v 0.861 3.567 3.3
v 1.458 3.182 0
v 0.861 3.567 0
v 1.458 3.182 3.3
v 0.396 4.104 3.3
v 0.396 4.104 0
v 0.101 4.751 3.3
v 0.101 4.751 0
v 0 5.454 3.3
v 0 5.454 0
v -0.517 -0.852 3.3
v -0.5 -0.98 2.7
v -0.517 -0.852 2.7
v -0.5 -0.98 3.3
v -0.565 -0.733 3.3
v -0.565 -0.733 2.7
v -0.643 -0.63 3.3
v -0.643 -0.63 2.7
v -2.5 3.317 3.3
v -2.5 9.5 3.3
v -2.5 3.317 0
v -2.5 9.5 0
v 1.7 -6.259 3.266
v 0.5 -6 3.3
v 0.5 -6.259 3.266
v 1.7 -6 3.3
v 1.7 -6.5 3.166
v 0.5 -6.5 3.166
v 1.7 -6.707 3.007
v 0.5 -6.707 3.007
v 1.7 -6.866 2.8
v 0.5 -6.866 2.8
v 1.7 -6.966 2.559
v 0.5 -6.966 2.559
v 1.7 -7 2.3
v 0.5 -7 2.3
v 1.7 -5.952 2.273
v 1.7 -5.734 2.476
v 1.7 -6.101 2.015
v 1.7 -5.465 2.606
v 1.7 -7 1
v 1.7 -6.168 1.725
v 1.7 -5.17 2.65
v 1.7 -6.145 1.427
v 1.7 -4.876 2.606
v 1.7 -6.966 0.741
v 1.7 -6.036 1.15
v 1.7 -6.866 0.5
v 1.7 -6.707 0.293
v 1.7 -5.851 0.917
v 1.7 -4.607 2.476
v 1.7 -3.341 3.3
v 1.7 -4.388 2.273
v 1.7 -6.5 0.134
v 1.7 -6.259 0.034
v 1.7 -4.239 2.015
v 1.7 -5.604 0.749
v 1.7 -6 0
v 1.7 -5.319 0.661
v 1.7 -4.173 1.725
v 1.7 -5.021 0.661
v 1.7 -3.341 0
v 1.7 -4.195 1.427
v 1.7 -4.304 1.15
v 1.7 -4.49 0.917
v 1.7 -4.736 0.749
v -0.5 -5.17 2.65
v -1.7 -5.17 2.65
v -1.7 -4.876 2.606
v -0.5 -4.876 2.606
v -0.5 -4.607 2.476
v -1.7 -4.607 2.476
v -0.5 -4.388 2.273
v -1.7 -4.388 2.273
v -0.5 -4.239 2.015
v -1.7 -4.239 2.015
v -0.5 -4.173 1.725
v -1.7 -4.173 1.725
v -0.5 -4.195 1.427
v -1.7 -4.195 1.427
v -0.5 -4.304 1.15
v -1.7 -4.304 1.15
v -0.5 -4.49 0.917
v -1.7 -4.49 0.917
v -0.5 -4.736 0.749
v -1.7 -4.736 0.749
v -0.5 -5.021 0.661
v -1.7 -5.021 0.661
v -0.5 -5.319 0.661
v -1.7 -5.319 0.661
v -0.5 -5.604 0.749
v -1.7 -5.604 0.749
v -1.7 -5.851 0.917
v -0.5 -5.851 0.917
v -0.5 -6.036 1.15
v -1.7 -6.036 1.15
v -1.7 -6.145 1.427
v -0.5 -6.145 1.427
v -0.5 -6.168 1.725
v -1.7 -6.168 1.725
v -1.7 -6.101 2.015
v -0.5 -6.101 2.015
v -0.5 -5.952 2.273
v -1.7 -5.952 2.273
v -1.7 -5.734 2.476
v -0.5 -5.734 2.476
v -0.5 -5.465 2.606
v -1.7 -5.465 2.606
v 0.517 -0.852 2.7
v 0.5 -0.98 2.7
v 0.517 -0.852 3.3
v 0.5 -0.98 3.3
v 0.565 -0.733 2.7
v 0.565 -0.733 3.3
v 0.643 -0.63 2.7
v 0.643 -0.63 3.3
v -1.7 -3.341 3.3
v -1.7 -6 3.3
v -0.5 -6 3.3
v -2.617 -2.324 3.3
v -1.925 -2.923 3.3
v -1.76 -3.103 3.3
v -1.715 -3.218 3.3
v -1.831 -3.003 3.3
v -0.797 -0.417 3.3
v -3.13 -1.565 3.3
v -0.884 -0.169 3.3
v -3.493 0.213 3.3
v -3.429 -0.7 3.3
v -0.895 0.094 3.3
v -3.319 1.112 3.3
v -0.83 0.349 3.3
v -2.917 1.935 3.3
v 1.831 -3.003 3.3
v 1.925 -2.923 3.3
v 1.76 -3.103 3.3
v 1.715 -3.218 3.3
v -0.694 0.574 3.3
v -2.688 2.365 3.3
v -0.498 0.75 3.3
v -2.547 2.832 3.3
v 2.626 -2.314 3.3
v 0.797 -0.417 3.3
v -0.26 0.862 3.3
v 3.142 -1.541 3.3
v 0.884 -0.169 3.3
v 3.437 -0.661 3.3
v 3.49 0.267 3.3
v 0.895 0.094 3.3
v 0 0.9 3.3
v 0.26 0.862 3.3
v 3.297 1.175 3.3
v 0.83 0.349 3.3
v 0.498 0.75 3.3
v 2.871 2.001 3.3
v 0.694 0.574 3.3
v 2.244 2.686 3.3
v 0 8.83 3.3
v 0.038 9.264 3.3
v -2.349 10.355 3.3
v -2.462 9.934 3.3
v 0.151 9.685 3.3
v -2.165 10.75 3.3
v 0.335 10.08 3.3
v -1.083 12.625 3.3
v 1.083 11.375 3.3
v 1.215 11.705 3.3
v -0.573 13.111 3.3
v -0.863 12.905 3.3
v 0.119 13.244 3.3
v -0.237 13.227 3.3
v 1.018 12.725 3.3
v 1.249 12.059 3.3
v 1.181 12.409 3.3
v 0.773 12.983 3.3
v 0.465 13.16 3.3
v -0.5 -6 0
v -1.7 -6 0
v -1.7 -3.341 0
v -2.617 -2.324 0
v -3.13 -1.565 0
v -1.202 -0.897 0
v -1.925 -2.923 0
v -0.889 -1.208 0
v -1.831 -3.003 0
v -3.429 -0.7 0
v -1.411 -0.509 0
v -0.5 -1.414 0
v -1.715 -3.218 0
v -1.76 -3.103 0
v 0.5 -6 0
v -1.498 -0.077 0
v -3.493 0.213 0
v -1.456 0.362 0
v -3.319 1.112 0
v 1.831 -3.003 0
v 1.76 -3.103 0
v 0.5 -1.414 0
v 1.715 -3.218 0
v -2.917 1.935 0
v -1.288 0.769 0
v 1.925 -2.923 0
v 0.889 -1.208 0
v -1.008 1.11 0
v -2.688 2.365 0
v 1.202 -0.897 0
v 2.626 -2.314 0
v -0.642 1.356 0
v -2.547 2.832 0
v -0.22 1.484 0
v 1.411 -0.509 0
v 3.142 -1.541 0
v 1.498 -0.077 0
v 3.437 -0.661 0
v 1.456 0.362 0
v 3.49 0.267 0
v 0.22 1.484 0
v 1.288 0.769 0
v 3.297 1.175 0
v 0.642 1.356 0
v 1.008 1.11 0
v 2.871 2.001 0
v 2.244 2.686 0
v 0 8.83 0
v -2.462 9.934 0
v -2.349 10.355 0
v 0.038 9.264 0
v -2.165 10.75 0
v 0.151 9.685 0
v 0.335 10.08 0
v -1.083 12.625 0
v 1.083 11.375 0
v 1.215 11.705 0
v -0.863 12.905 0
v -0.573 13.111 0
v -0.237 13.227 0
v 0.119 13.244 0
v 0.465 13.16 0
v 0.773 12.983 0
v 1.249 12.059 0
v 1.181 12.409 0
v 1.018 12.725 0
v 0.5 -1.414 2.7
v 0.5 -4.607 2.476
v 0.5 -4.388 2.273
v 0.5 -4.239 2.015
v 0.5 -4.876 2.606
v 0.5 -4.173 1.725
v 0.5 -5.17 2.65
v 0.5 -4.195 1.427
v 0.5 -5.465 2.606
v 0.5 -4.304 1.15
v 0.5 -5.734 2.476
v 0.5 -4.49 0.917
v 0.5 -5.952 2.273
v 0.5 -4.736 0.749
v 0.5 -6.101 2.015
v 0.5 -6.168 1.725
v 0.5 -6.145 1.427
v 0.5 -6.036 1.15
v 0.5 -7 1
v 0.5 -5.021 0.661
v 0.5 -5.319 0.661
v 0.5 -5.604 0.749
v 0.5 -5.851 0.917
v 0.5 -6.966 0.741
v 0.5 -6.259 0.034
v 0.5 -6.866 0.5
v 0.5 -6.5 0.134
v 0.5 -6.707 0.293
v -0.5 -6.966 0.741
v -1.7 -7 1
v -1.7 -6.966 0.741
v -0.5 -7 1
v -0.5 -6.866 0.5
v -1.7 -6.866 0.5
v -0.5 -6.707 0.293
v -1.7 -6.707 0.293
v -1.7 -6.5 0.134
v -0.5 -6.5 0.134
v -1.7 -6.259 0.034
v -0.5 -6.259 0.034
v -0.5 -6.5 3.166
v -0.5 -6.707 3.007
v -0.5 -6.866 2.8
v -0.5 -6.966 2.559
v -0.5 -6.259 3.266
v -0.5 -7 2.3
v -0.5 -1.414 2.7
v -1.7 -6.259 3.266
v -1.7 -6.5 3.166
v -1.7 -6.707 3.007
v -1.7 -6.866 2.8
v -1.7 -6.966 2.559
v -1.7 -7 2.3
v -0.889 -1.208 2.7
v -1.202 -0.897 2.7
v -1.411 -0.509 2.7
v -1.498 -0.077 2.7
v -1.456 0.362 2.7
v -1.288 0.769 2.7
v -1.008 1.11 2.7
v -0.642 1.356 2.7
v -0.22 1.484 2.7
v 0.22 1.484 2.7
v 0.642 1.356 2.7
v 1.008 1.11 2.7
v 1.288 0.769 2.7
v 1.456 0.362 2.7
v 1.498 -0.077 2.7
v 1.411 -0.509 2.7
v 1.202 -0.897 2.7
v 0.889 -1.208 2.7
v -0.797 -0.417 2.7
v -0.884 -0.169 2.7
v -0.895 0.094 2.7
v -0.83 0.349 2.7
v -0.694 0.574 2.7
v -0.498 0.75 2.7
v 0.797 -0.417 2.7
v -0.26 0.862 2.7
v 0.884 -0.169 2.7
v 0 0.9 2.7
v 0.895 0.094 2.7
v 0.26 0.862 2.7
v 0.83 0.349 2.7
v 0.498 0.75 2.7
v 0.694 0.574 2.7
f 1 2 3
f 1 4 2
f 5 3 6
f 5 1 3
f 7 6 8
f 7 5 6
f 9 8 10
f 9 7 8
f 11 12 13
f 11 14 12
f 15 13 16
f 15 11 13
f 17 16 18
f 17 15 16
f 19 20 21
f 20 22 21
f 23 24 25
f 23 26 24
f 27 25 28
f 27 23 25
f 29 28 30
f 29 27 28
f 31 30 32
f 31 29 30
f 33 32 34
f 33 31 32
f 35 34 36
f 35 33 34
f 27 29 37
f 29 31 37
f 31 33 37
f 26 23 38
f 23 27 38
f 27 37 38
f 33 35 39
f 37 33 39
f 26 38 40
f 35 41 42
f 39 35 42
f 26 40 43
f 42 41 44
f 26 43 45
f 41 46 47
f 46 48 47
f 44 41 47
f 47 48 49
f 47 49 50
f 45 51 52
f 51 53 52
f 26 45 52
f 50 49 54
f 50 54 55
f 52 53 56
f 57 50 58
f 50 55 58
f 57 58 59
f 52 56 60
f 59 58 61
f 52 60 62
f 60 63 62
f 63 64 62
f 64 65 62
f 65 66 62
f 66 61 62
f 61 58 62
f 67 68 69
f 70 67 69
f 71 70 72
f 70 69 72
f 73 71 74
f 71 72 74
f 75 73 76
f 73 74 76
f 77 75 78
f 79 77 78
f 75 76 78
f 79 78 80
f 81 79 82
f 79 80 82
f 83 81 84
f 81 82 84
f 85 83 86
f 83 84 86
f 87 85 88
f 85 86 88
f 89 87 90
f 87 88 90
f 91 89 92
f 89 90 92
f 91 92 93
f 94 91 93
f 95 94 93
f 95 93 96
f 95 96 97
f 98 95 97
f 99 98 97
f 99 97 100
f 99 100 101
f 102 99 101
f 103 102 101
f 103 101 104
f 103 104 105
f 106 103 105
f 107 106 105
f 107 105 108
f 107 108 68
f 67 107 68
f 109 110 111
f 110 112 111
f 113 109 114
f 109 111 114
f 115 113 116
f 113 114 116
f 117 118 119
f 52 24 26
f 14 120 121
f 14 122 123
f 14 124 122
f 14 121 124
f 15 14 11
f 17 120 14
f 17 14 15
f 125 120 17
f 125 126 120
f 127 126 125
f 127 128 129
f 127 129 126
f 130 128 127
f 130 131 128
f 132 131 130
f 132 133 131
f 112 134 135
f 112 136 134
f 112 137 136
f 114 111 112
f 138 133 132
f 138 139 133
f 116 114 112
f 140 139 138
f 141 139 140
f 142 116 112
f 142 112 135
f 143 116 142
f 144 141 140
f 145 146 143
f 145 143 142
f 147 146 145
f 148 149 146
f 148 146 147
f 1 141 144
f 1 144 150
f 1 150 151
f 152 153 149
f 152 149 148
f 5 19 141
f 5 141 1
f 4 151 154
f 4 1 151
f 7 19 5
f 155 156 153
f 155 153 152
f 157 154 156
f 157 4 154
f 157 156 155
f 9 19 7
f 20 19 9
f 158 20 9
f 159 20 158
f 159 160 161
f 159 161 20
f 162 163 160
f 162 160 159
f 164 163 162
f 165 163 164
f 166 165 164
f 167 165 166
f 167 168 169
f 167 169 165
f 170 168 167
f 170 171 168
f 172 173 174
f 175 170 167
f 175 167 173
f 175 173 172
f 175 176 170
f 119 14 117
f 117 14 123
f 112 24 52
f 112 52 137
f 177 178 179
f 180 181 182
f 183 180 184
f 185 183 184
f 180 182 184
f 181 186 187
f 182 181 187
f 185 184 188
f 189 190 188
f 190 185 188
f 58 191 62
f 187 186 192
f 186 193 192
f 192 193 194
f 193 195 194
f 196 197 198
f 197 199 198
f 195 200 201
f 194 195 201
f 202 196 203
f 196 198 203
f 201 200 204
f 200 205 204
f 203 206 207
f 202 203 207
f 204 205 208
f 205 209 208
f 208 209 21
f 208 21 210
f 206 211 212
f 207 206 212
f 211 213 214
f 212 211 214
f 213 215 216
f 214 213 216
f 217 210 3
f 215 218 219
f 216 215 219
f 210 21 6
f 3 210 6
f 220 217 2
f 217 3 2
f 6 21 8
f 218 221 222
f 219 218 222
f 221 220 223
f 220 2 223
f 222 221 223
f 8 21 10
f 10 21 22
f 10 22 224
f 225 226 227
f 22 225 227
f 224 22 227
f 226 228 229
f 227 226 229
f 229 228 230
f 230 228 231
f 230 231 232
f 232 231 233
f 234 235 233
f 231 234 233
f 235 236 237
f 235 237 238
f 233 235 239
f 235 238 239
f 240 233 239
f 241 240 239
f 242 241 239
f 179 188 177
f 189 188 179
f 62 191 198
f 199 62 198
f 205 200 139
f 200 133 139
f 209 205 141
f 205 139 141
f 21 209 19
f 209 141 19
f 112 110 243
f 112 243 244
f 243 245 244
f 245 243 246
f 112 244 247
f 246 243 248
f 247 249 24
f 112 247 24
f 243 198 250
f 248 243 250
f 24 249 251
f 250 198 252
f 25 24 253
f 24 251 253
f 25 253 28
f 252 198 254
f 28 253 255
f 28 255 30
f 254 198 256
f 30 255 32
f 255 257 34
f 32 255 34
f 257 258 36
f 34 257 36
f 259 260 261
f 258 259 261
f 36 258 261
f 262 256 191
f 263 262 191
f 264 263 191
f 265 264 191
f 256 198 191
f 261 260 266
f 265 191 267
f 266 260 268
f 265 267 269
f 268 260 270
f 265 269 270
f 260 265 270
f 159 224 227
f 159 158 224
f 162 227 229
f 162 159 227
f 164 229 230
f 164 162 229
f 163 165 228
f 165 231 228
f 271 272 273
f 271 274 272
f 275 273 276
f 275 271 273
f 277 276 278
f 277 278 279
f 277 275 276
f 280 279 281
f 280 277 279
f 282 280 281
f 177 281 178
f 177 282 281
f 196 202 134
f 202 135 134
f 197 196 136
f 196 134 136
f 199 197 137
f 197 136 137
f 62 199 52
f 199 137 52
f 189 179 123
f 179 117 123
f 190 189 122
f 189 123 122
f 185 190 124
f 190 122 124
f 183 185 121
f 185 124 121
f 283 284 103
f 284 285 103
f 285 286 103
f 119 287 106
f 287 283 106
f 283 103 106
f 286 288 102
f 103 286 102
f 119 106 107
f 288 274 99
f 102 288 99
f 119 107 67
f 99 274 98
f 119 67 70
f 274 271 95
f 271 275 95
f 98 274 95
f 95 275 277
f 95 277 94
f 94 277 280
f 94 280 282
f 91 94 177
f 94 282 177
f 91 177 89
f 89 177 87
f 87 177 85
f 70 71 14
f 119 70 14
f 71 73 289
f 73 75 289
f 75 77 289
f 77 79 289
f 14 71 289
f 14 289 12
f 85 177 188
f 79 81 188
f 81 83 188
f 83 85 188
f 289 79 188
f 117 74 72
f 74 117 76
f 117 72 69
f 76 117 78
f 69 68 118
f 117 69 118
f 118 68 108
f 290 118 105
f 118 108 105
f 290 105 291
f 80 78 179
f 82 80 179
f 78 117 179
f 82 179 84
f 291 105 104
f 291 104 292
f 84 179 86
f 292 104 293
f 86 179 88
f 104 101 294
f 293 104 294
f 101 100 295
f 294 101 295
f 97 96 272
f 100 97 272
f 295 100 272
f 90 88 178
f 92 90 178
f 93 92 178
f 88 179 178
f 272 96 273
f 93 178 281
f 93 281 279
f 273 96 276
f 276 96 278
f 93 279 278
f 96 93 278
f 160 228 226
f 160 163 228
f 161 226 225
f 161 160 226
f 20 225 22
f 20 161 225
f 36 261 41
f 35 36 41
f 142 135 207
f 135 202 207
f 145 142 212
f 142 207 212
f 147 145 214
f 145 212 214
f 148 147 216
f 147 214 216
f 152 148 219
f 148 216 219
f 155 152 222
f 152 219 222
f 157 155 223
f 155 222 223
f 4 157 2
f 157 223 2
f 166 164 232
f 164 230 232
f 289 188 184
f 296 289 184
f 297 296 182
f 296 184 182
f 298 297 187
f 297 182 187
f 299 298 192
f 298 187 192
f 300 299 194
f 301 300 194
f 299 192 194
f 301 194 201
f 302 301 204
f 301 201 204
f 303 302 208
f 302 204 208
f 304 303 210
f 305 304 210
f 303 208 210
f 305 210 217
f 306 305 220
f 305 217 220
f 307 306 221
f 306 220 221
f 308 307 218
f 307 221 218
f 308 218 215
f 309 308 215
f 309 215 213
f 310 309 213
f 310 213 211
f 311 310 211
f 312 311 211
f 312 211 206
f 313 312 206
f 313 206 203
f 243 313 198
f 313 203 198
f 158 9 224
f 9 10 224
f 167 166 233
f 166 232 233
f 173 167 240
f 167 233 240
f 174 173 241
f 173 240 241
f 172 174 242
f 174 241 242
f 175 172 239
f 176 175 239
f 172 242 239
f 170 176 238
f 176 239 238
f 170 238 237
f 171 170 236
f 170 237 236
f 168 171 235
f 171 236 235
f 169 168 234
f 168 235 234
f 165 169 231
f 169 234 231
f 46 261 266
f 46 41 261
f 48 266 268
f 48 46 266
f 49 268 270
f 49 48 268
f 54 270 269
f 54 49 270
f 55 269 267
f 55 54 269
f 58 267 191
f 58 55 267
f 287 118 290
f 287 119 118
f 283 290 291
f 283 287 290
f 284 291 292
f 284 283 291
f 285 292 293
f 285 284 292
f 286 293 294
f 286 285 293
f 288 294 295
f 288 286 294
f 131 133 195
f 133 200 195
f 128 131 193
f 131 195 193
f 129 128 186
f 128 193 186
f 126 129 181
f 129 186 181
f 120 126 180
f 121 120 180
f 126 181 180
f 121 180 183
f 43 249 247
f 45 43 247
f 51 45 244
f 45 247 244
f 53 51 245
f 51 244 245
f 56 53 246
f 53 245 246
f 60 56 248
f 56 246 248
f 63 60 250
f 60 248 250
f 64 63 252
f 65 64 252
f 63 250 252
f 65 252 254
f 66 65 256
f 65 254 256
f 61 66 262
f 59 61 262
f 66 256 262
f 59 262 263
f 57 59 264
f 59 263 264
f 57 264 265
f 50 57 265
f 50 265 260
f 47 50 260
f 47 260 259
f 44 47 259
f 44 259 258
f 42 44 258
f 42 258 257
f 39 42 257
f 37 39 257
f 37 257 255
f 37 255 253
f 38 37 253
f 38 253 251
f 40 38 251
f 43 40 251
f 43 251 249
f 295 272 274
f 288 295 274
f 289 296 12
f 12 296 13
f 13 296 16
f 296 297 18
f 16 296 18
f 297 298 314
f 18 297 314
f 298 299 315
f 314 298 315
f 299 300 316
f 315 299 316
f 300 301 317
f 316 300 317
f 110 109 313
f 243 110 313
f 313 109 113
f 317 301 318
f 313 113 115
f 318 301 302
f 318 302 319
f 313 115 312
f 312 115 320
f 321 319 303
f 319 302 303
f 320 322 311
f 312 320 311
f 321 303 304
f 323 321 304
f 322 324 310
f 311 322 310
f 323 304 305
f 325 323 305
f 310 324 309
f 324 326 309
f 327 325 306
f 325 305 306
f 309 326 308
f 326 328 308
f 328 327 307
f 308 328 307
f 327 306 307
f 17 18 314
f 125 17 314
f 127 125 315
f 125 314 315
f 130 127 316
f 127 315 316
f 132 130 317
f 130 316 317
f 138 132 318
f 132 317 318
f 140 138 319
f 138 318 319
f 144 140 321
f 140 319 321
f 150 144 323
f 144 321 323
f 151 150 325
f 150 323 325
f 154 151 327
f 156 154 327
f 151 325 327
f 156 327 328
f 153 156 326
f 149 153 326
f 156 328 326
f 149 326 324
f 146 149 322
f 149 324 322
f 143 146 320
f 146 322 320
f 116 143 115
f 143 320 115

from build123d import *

# Parameters (mm, degrees)
BOSS_EXTRUDE1_DEPTH = 2.7
BOSS_EXTRUDE2_DEPTH = 0.6
FILLET1_R           = 0.5
FILLET2_R           = 2.5
FILLET3_R           = 0.5
FILLET4_R           = 1
SKETCH3_R           = 1
CUT_EXTRUDE1_DEPTH  = 15.611382549


with BuildPart() as part:
    # Sketch1 → Boss-Extrude1 (new body)
    with BuildSketch(Plane.XY):
        with BuildLine():
            Line((-1.082531755, 12.625), (-2.5, 10.169872981))
            Line((-2.5, 10.169872981), (-2.5, 2.449489743))
            ThreePointArc((-2.5, 2.449489743), (-3.463668402, -0.502992247), (-1.7, -3.059411708))
            Line((-1.7, -3.059411708), (-1.7, -7))
            Line((-1.7, -7), (-0.5, -7))
            Line((-0.5, -7), (-0.5, -1.414213562))
            ThreePointArc((-0.5, -1.414213562), (0, 1.5), (0.5, -1.414213562))
            Line((0.5, -1.414213562), (0.5, -7))
            Line((0.5, -7), (1.7, -7))
            Line((1.7, -7), (1.7, -3.059411708))
            ThreePointArc((1.7, -3.059411708), (3.388062941, 0.878082861), (0, 3.5))
            Line((0, 3.5), (0, 9.5))
            Line((0, 9.5), (1.082531755, 11.375))
            ThreePointArc((1.082531755, 11.375), (0.625, 13.082531755), (-1.082531755, 12.625))
        make_face()
    extrude(amount=BOSS_EXTRUDE1_DEPTH)

    # Sketch2 → Boss-Extrude2 (add)
    with BuildSketch(Plane.XY.offset(2.7)):
        with BuildLine():
            Line((0.5, -0.748331477), (0.5, -7))
            Line((0.5, -7), (1.7, -7))
            Line((1.7, -7), (1.7, -3.059411708))
            ThreePointArc((1.7, -3.059411708), (3.388062941, 0.878082861), (0, 3.5))
            Line((0, 3.5), (0, 9.5))
            Line((0, 9.5), (1.082531755, 11.375))
            ThreePointArc((1.082531755, 11.375), (0.625, 13.082531755), (-1.082531755, 12.625))
            Line((-1.082531755, 12.625), (-2.5, 10.169872981))
            Line((-2.5, 10.169872981), (-2.5, 2.449489743))
            ThreePointArc((-2.5, 2.449489743), (-3.463668402, -0.502992247), (-1.7, -3.059411708))
            Line((-1.7, -3.059411708), (-1.7, -7))
            Line((-1.7, -7), (-0.5, -7))
            Line((-0.5, -7), (-0.5, -0.748331477))
            ThreePointArc((-0.5, -0.748331477), (0, 0.9), (0.5, -0.748331477))
        make_face()
    extrude(amount=BOSS_EXTRUDE2_DEPTH)

    # Fillet1
    fillet1_edges = [part.edges().sort_by_distance(p)[0] for p in [
        (-0.5, -0.748331477, 3),
        (0.5, -0.748331477, 3),
    ]]
    fillet(fillet1_edges, radius=FILLET1_R)

    # Fillet2
    fillet2_edges = [part.edges().sort_by_distance(p)[0] for p in [
        (-2.5, 2.449489743, 1.65),
        (-2.5, 10.169872981, 1.65),
        (0, 9.5, 1.65),
        (0, 3.5, 1.65),
    ]]
    fillet(fillet2_edges, radius=FILLET2_R)

    # Fillet3
    fillet3_edges = [part.edges().sort_by_distance(p)[0] for p in [
        (-1.7, -3.059411708, 1.65),
        (1.7, -3.059411708, 1.65),
    ]]
    fillet(fillet3_edges, radius=FILLET3_R)

    # Fillet4
    fillet4_edges = [part.edges().sort_by_distance(p)[0] for p in [
        (-1.1, -7, 0),
        (1.1, -7, 0),
        (1.1, -7, 3.3),
        (-1.1, -7, 3.3),
    ]]
    fillet(fillet4_edges, radius=FILLET4_R)

    # Sketch3 → Cut-Extrude1 (cut, through all)
    with BuildSketch(Plane.ZY.offset(1.7)):
        with Locations((1.65, -5.170329309)):
            Circle(SKETCH3_R)
    extrude(amount=-CUT_EXTRUDE1_DEPTH, mode=Mode.SUBTRACT)


solid = part.part
